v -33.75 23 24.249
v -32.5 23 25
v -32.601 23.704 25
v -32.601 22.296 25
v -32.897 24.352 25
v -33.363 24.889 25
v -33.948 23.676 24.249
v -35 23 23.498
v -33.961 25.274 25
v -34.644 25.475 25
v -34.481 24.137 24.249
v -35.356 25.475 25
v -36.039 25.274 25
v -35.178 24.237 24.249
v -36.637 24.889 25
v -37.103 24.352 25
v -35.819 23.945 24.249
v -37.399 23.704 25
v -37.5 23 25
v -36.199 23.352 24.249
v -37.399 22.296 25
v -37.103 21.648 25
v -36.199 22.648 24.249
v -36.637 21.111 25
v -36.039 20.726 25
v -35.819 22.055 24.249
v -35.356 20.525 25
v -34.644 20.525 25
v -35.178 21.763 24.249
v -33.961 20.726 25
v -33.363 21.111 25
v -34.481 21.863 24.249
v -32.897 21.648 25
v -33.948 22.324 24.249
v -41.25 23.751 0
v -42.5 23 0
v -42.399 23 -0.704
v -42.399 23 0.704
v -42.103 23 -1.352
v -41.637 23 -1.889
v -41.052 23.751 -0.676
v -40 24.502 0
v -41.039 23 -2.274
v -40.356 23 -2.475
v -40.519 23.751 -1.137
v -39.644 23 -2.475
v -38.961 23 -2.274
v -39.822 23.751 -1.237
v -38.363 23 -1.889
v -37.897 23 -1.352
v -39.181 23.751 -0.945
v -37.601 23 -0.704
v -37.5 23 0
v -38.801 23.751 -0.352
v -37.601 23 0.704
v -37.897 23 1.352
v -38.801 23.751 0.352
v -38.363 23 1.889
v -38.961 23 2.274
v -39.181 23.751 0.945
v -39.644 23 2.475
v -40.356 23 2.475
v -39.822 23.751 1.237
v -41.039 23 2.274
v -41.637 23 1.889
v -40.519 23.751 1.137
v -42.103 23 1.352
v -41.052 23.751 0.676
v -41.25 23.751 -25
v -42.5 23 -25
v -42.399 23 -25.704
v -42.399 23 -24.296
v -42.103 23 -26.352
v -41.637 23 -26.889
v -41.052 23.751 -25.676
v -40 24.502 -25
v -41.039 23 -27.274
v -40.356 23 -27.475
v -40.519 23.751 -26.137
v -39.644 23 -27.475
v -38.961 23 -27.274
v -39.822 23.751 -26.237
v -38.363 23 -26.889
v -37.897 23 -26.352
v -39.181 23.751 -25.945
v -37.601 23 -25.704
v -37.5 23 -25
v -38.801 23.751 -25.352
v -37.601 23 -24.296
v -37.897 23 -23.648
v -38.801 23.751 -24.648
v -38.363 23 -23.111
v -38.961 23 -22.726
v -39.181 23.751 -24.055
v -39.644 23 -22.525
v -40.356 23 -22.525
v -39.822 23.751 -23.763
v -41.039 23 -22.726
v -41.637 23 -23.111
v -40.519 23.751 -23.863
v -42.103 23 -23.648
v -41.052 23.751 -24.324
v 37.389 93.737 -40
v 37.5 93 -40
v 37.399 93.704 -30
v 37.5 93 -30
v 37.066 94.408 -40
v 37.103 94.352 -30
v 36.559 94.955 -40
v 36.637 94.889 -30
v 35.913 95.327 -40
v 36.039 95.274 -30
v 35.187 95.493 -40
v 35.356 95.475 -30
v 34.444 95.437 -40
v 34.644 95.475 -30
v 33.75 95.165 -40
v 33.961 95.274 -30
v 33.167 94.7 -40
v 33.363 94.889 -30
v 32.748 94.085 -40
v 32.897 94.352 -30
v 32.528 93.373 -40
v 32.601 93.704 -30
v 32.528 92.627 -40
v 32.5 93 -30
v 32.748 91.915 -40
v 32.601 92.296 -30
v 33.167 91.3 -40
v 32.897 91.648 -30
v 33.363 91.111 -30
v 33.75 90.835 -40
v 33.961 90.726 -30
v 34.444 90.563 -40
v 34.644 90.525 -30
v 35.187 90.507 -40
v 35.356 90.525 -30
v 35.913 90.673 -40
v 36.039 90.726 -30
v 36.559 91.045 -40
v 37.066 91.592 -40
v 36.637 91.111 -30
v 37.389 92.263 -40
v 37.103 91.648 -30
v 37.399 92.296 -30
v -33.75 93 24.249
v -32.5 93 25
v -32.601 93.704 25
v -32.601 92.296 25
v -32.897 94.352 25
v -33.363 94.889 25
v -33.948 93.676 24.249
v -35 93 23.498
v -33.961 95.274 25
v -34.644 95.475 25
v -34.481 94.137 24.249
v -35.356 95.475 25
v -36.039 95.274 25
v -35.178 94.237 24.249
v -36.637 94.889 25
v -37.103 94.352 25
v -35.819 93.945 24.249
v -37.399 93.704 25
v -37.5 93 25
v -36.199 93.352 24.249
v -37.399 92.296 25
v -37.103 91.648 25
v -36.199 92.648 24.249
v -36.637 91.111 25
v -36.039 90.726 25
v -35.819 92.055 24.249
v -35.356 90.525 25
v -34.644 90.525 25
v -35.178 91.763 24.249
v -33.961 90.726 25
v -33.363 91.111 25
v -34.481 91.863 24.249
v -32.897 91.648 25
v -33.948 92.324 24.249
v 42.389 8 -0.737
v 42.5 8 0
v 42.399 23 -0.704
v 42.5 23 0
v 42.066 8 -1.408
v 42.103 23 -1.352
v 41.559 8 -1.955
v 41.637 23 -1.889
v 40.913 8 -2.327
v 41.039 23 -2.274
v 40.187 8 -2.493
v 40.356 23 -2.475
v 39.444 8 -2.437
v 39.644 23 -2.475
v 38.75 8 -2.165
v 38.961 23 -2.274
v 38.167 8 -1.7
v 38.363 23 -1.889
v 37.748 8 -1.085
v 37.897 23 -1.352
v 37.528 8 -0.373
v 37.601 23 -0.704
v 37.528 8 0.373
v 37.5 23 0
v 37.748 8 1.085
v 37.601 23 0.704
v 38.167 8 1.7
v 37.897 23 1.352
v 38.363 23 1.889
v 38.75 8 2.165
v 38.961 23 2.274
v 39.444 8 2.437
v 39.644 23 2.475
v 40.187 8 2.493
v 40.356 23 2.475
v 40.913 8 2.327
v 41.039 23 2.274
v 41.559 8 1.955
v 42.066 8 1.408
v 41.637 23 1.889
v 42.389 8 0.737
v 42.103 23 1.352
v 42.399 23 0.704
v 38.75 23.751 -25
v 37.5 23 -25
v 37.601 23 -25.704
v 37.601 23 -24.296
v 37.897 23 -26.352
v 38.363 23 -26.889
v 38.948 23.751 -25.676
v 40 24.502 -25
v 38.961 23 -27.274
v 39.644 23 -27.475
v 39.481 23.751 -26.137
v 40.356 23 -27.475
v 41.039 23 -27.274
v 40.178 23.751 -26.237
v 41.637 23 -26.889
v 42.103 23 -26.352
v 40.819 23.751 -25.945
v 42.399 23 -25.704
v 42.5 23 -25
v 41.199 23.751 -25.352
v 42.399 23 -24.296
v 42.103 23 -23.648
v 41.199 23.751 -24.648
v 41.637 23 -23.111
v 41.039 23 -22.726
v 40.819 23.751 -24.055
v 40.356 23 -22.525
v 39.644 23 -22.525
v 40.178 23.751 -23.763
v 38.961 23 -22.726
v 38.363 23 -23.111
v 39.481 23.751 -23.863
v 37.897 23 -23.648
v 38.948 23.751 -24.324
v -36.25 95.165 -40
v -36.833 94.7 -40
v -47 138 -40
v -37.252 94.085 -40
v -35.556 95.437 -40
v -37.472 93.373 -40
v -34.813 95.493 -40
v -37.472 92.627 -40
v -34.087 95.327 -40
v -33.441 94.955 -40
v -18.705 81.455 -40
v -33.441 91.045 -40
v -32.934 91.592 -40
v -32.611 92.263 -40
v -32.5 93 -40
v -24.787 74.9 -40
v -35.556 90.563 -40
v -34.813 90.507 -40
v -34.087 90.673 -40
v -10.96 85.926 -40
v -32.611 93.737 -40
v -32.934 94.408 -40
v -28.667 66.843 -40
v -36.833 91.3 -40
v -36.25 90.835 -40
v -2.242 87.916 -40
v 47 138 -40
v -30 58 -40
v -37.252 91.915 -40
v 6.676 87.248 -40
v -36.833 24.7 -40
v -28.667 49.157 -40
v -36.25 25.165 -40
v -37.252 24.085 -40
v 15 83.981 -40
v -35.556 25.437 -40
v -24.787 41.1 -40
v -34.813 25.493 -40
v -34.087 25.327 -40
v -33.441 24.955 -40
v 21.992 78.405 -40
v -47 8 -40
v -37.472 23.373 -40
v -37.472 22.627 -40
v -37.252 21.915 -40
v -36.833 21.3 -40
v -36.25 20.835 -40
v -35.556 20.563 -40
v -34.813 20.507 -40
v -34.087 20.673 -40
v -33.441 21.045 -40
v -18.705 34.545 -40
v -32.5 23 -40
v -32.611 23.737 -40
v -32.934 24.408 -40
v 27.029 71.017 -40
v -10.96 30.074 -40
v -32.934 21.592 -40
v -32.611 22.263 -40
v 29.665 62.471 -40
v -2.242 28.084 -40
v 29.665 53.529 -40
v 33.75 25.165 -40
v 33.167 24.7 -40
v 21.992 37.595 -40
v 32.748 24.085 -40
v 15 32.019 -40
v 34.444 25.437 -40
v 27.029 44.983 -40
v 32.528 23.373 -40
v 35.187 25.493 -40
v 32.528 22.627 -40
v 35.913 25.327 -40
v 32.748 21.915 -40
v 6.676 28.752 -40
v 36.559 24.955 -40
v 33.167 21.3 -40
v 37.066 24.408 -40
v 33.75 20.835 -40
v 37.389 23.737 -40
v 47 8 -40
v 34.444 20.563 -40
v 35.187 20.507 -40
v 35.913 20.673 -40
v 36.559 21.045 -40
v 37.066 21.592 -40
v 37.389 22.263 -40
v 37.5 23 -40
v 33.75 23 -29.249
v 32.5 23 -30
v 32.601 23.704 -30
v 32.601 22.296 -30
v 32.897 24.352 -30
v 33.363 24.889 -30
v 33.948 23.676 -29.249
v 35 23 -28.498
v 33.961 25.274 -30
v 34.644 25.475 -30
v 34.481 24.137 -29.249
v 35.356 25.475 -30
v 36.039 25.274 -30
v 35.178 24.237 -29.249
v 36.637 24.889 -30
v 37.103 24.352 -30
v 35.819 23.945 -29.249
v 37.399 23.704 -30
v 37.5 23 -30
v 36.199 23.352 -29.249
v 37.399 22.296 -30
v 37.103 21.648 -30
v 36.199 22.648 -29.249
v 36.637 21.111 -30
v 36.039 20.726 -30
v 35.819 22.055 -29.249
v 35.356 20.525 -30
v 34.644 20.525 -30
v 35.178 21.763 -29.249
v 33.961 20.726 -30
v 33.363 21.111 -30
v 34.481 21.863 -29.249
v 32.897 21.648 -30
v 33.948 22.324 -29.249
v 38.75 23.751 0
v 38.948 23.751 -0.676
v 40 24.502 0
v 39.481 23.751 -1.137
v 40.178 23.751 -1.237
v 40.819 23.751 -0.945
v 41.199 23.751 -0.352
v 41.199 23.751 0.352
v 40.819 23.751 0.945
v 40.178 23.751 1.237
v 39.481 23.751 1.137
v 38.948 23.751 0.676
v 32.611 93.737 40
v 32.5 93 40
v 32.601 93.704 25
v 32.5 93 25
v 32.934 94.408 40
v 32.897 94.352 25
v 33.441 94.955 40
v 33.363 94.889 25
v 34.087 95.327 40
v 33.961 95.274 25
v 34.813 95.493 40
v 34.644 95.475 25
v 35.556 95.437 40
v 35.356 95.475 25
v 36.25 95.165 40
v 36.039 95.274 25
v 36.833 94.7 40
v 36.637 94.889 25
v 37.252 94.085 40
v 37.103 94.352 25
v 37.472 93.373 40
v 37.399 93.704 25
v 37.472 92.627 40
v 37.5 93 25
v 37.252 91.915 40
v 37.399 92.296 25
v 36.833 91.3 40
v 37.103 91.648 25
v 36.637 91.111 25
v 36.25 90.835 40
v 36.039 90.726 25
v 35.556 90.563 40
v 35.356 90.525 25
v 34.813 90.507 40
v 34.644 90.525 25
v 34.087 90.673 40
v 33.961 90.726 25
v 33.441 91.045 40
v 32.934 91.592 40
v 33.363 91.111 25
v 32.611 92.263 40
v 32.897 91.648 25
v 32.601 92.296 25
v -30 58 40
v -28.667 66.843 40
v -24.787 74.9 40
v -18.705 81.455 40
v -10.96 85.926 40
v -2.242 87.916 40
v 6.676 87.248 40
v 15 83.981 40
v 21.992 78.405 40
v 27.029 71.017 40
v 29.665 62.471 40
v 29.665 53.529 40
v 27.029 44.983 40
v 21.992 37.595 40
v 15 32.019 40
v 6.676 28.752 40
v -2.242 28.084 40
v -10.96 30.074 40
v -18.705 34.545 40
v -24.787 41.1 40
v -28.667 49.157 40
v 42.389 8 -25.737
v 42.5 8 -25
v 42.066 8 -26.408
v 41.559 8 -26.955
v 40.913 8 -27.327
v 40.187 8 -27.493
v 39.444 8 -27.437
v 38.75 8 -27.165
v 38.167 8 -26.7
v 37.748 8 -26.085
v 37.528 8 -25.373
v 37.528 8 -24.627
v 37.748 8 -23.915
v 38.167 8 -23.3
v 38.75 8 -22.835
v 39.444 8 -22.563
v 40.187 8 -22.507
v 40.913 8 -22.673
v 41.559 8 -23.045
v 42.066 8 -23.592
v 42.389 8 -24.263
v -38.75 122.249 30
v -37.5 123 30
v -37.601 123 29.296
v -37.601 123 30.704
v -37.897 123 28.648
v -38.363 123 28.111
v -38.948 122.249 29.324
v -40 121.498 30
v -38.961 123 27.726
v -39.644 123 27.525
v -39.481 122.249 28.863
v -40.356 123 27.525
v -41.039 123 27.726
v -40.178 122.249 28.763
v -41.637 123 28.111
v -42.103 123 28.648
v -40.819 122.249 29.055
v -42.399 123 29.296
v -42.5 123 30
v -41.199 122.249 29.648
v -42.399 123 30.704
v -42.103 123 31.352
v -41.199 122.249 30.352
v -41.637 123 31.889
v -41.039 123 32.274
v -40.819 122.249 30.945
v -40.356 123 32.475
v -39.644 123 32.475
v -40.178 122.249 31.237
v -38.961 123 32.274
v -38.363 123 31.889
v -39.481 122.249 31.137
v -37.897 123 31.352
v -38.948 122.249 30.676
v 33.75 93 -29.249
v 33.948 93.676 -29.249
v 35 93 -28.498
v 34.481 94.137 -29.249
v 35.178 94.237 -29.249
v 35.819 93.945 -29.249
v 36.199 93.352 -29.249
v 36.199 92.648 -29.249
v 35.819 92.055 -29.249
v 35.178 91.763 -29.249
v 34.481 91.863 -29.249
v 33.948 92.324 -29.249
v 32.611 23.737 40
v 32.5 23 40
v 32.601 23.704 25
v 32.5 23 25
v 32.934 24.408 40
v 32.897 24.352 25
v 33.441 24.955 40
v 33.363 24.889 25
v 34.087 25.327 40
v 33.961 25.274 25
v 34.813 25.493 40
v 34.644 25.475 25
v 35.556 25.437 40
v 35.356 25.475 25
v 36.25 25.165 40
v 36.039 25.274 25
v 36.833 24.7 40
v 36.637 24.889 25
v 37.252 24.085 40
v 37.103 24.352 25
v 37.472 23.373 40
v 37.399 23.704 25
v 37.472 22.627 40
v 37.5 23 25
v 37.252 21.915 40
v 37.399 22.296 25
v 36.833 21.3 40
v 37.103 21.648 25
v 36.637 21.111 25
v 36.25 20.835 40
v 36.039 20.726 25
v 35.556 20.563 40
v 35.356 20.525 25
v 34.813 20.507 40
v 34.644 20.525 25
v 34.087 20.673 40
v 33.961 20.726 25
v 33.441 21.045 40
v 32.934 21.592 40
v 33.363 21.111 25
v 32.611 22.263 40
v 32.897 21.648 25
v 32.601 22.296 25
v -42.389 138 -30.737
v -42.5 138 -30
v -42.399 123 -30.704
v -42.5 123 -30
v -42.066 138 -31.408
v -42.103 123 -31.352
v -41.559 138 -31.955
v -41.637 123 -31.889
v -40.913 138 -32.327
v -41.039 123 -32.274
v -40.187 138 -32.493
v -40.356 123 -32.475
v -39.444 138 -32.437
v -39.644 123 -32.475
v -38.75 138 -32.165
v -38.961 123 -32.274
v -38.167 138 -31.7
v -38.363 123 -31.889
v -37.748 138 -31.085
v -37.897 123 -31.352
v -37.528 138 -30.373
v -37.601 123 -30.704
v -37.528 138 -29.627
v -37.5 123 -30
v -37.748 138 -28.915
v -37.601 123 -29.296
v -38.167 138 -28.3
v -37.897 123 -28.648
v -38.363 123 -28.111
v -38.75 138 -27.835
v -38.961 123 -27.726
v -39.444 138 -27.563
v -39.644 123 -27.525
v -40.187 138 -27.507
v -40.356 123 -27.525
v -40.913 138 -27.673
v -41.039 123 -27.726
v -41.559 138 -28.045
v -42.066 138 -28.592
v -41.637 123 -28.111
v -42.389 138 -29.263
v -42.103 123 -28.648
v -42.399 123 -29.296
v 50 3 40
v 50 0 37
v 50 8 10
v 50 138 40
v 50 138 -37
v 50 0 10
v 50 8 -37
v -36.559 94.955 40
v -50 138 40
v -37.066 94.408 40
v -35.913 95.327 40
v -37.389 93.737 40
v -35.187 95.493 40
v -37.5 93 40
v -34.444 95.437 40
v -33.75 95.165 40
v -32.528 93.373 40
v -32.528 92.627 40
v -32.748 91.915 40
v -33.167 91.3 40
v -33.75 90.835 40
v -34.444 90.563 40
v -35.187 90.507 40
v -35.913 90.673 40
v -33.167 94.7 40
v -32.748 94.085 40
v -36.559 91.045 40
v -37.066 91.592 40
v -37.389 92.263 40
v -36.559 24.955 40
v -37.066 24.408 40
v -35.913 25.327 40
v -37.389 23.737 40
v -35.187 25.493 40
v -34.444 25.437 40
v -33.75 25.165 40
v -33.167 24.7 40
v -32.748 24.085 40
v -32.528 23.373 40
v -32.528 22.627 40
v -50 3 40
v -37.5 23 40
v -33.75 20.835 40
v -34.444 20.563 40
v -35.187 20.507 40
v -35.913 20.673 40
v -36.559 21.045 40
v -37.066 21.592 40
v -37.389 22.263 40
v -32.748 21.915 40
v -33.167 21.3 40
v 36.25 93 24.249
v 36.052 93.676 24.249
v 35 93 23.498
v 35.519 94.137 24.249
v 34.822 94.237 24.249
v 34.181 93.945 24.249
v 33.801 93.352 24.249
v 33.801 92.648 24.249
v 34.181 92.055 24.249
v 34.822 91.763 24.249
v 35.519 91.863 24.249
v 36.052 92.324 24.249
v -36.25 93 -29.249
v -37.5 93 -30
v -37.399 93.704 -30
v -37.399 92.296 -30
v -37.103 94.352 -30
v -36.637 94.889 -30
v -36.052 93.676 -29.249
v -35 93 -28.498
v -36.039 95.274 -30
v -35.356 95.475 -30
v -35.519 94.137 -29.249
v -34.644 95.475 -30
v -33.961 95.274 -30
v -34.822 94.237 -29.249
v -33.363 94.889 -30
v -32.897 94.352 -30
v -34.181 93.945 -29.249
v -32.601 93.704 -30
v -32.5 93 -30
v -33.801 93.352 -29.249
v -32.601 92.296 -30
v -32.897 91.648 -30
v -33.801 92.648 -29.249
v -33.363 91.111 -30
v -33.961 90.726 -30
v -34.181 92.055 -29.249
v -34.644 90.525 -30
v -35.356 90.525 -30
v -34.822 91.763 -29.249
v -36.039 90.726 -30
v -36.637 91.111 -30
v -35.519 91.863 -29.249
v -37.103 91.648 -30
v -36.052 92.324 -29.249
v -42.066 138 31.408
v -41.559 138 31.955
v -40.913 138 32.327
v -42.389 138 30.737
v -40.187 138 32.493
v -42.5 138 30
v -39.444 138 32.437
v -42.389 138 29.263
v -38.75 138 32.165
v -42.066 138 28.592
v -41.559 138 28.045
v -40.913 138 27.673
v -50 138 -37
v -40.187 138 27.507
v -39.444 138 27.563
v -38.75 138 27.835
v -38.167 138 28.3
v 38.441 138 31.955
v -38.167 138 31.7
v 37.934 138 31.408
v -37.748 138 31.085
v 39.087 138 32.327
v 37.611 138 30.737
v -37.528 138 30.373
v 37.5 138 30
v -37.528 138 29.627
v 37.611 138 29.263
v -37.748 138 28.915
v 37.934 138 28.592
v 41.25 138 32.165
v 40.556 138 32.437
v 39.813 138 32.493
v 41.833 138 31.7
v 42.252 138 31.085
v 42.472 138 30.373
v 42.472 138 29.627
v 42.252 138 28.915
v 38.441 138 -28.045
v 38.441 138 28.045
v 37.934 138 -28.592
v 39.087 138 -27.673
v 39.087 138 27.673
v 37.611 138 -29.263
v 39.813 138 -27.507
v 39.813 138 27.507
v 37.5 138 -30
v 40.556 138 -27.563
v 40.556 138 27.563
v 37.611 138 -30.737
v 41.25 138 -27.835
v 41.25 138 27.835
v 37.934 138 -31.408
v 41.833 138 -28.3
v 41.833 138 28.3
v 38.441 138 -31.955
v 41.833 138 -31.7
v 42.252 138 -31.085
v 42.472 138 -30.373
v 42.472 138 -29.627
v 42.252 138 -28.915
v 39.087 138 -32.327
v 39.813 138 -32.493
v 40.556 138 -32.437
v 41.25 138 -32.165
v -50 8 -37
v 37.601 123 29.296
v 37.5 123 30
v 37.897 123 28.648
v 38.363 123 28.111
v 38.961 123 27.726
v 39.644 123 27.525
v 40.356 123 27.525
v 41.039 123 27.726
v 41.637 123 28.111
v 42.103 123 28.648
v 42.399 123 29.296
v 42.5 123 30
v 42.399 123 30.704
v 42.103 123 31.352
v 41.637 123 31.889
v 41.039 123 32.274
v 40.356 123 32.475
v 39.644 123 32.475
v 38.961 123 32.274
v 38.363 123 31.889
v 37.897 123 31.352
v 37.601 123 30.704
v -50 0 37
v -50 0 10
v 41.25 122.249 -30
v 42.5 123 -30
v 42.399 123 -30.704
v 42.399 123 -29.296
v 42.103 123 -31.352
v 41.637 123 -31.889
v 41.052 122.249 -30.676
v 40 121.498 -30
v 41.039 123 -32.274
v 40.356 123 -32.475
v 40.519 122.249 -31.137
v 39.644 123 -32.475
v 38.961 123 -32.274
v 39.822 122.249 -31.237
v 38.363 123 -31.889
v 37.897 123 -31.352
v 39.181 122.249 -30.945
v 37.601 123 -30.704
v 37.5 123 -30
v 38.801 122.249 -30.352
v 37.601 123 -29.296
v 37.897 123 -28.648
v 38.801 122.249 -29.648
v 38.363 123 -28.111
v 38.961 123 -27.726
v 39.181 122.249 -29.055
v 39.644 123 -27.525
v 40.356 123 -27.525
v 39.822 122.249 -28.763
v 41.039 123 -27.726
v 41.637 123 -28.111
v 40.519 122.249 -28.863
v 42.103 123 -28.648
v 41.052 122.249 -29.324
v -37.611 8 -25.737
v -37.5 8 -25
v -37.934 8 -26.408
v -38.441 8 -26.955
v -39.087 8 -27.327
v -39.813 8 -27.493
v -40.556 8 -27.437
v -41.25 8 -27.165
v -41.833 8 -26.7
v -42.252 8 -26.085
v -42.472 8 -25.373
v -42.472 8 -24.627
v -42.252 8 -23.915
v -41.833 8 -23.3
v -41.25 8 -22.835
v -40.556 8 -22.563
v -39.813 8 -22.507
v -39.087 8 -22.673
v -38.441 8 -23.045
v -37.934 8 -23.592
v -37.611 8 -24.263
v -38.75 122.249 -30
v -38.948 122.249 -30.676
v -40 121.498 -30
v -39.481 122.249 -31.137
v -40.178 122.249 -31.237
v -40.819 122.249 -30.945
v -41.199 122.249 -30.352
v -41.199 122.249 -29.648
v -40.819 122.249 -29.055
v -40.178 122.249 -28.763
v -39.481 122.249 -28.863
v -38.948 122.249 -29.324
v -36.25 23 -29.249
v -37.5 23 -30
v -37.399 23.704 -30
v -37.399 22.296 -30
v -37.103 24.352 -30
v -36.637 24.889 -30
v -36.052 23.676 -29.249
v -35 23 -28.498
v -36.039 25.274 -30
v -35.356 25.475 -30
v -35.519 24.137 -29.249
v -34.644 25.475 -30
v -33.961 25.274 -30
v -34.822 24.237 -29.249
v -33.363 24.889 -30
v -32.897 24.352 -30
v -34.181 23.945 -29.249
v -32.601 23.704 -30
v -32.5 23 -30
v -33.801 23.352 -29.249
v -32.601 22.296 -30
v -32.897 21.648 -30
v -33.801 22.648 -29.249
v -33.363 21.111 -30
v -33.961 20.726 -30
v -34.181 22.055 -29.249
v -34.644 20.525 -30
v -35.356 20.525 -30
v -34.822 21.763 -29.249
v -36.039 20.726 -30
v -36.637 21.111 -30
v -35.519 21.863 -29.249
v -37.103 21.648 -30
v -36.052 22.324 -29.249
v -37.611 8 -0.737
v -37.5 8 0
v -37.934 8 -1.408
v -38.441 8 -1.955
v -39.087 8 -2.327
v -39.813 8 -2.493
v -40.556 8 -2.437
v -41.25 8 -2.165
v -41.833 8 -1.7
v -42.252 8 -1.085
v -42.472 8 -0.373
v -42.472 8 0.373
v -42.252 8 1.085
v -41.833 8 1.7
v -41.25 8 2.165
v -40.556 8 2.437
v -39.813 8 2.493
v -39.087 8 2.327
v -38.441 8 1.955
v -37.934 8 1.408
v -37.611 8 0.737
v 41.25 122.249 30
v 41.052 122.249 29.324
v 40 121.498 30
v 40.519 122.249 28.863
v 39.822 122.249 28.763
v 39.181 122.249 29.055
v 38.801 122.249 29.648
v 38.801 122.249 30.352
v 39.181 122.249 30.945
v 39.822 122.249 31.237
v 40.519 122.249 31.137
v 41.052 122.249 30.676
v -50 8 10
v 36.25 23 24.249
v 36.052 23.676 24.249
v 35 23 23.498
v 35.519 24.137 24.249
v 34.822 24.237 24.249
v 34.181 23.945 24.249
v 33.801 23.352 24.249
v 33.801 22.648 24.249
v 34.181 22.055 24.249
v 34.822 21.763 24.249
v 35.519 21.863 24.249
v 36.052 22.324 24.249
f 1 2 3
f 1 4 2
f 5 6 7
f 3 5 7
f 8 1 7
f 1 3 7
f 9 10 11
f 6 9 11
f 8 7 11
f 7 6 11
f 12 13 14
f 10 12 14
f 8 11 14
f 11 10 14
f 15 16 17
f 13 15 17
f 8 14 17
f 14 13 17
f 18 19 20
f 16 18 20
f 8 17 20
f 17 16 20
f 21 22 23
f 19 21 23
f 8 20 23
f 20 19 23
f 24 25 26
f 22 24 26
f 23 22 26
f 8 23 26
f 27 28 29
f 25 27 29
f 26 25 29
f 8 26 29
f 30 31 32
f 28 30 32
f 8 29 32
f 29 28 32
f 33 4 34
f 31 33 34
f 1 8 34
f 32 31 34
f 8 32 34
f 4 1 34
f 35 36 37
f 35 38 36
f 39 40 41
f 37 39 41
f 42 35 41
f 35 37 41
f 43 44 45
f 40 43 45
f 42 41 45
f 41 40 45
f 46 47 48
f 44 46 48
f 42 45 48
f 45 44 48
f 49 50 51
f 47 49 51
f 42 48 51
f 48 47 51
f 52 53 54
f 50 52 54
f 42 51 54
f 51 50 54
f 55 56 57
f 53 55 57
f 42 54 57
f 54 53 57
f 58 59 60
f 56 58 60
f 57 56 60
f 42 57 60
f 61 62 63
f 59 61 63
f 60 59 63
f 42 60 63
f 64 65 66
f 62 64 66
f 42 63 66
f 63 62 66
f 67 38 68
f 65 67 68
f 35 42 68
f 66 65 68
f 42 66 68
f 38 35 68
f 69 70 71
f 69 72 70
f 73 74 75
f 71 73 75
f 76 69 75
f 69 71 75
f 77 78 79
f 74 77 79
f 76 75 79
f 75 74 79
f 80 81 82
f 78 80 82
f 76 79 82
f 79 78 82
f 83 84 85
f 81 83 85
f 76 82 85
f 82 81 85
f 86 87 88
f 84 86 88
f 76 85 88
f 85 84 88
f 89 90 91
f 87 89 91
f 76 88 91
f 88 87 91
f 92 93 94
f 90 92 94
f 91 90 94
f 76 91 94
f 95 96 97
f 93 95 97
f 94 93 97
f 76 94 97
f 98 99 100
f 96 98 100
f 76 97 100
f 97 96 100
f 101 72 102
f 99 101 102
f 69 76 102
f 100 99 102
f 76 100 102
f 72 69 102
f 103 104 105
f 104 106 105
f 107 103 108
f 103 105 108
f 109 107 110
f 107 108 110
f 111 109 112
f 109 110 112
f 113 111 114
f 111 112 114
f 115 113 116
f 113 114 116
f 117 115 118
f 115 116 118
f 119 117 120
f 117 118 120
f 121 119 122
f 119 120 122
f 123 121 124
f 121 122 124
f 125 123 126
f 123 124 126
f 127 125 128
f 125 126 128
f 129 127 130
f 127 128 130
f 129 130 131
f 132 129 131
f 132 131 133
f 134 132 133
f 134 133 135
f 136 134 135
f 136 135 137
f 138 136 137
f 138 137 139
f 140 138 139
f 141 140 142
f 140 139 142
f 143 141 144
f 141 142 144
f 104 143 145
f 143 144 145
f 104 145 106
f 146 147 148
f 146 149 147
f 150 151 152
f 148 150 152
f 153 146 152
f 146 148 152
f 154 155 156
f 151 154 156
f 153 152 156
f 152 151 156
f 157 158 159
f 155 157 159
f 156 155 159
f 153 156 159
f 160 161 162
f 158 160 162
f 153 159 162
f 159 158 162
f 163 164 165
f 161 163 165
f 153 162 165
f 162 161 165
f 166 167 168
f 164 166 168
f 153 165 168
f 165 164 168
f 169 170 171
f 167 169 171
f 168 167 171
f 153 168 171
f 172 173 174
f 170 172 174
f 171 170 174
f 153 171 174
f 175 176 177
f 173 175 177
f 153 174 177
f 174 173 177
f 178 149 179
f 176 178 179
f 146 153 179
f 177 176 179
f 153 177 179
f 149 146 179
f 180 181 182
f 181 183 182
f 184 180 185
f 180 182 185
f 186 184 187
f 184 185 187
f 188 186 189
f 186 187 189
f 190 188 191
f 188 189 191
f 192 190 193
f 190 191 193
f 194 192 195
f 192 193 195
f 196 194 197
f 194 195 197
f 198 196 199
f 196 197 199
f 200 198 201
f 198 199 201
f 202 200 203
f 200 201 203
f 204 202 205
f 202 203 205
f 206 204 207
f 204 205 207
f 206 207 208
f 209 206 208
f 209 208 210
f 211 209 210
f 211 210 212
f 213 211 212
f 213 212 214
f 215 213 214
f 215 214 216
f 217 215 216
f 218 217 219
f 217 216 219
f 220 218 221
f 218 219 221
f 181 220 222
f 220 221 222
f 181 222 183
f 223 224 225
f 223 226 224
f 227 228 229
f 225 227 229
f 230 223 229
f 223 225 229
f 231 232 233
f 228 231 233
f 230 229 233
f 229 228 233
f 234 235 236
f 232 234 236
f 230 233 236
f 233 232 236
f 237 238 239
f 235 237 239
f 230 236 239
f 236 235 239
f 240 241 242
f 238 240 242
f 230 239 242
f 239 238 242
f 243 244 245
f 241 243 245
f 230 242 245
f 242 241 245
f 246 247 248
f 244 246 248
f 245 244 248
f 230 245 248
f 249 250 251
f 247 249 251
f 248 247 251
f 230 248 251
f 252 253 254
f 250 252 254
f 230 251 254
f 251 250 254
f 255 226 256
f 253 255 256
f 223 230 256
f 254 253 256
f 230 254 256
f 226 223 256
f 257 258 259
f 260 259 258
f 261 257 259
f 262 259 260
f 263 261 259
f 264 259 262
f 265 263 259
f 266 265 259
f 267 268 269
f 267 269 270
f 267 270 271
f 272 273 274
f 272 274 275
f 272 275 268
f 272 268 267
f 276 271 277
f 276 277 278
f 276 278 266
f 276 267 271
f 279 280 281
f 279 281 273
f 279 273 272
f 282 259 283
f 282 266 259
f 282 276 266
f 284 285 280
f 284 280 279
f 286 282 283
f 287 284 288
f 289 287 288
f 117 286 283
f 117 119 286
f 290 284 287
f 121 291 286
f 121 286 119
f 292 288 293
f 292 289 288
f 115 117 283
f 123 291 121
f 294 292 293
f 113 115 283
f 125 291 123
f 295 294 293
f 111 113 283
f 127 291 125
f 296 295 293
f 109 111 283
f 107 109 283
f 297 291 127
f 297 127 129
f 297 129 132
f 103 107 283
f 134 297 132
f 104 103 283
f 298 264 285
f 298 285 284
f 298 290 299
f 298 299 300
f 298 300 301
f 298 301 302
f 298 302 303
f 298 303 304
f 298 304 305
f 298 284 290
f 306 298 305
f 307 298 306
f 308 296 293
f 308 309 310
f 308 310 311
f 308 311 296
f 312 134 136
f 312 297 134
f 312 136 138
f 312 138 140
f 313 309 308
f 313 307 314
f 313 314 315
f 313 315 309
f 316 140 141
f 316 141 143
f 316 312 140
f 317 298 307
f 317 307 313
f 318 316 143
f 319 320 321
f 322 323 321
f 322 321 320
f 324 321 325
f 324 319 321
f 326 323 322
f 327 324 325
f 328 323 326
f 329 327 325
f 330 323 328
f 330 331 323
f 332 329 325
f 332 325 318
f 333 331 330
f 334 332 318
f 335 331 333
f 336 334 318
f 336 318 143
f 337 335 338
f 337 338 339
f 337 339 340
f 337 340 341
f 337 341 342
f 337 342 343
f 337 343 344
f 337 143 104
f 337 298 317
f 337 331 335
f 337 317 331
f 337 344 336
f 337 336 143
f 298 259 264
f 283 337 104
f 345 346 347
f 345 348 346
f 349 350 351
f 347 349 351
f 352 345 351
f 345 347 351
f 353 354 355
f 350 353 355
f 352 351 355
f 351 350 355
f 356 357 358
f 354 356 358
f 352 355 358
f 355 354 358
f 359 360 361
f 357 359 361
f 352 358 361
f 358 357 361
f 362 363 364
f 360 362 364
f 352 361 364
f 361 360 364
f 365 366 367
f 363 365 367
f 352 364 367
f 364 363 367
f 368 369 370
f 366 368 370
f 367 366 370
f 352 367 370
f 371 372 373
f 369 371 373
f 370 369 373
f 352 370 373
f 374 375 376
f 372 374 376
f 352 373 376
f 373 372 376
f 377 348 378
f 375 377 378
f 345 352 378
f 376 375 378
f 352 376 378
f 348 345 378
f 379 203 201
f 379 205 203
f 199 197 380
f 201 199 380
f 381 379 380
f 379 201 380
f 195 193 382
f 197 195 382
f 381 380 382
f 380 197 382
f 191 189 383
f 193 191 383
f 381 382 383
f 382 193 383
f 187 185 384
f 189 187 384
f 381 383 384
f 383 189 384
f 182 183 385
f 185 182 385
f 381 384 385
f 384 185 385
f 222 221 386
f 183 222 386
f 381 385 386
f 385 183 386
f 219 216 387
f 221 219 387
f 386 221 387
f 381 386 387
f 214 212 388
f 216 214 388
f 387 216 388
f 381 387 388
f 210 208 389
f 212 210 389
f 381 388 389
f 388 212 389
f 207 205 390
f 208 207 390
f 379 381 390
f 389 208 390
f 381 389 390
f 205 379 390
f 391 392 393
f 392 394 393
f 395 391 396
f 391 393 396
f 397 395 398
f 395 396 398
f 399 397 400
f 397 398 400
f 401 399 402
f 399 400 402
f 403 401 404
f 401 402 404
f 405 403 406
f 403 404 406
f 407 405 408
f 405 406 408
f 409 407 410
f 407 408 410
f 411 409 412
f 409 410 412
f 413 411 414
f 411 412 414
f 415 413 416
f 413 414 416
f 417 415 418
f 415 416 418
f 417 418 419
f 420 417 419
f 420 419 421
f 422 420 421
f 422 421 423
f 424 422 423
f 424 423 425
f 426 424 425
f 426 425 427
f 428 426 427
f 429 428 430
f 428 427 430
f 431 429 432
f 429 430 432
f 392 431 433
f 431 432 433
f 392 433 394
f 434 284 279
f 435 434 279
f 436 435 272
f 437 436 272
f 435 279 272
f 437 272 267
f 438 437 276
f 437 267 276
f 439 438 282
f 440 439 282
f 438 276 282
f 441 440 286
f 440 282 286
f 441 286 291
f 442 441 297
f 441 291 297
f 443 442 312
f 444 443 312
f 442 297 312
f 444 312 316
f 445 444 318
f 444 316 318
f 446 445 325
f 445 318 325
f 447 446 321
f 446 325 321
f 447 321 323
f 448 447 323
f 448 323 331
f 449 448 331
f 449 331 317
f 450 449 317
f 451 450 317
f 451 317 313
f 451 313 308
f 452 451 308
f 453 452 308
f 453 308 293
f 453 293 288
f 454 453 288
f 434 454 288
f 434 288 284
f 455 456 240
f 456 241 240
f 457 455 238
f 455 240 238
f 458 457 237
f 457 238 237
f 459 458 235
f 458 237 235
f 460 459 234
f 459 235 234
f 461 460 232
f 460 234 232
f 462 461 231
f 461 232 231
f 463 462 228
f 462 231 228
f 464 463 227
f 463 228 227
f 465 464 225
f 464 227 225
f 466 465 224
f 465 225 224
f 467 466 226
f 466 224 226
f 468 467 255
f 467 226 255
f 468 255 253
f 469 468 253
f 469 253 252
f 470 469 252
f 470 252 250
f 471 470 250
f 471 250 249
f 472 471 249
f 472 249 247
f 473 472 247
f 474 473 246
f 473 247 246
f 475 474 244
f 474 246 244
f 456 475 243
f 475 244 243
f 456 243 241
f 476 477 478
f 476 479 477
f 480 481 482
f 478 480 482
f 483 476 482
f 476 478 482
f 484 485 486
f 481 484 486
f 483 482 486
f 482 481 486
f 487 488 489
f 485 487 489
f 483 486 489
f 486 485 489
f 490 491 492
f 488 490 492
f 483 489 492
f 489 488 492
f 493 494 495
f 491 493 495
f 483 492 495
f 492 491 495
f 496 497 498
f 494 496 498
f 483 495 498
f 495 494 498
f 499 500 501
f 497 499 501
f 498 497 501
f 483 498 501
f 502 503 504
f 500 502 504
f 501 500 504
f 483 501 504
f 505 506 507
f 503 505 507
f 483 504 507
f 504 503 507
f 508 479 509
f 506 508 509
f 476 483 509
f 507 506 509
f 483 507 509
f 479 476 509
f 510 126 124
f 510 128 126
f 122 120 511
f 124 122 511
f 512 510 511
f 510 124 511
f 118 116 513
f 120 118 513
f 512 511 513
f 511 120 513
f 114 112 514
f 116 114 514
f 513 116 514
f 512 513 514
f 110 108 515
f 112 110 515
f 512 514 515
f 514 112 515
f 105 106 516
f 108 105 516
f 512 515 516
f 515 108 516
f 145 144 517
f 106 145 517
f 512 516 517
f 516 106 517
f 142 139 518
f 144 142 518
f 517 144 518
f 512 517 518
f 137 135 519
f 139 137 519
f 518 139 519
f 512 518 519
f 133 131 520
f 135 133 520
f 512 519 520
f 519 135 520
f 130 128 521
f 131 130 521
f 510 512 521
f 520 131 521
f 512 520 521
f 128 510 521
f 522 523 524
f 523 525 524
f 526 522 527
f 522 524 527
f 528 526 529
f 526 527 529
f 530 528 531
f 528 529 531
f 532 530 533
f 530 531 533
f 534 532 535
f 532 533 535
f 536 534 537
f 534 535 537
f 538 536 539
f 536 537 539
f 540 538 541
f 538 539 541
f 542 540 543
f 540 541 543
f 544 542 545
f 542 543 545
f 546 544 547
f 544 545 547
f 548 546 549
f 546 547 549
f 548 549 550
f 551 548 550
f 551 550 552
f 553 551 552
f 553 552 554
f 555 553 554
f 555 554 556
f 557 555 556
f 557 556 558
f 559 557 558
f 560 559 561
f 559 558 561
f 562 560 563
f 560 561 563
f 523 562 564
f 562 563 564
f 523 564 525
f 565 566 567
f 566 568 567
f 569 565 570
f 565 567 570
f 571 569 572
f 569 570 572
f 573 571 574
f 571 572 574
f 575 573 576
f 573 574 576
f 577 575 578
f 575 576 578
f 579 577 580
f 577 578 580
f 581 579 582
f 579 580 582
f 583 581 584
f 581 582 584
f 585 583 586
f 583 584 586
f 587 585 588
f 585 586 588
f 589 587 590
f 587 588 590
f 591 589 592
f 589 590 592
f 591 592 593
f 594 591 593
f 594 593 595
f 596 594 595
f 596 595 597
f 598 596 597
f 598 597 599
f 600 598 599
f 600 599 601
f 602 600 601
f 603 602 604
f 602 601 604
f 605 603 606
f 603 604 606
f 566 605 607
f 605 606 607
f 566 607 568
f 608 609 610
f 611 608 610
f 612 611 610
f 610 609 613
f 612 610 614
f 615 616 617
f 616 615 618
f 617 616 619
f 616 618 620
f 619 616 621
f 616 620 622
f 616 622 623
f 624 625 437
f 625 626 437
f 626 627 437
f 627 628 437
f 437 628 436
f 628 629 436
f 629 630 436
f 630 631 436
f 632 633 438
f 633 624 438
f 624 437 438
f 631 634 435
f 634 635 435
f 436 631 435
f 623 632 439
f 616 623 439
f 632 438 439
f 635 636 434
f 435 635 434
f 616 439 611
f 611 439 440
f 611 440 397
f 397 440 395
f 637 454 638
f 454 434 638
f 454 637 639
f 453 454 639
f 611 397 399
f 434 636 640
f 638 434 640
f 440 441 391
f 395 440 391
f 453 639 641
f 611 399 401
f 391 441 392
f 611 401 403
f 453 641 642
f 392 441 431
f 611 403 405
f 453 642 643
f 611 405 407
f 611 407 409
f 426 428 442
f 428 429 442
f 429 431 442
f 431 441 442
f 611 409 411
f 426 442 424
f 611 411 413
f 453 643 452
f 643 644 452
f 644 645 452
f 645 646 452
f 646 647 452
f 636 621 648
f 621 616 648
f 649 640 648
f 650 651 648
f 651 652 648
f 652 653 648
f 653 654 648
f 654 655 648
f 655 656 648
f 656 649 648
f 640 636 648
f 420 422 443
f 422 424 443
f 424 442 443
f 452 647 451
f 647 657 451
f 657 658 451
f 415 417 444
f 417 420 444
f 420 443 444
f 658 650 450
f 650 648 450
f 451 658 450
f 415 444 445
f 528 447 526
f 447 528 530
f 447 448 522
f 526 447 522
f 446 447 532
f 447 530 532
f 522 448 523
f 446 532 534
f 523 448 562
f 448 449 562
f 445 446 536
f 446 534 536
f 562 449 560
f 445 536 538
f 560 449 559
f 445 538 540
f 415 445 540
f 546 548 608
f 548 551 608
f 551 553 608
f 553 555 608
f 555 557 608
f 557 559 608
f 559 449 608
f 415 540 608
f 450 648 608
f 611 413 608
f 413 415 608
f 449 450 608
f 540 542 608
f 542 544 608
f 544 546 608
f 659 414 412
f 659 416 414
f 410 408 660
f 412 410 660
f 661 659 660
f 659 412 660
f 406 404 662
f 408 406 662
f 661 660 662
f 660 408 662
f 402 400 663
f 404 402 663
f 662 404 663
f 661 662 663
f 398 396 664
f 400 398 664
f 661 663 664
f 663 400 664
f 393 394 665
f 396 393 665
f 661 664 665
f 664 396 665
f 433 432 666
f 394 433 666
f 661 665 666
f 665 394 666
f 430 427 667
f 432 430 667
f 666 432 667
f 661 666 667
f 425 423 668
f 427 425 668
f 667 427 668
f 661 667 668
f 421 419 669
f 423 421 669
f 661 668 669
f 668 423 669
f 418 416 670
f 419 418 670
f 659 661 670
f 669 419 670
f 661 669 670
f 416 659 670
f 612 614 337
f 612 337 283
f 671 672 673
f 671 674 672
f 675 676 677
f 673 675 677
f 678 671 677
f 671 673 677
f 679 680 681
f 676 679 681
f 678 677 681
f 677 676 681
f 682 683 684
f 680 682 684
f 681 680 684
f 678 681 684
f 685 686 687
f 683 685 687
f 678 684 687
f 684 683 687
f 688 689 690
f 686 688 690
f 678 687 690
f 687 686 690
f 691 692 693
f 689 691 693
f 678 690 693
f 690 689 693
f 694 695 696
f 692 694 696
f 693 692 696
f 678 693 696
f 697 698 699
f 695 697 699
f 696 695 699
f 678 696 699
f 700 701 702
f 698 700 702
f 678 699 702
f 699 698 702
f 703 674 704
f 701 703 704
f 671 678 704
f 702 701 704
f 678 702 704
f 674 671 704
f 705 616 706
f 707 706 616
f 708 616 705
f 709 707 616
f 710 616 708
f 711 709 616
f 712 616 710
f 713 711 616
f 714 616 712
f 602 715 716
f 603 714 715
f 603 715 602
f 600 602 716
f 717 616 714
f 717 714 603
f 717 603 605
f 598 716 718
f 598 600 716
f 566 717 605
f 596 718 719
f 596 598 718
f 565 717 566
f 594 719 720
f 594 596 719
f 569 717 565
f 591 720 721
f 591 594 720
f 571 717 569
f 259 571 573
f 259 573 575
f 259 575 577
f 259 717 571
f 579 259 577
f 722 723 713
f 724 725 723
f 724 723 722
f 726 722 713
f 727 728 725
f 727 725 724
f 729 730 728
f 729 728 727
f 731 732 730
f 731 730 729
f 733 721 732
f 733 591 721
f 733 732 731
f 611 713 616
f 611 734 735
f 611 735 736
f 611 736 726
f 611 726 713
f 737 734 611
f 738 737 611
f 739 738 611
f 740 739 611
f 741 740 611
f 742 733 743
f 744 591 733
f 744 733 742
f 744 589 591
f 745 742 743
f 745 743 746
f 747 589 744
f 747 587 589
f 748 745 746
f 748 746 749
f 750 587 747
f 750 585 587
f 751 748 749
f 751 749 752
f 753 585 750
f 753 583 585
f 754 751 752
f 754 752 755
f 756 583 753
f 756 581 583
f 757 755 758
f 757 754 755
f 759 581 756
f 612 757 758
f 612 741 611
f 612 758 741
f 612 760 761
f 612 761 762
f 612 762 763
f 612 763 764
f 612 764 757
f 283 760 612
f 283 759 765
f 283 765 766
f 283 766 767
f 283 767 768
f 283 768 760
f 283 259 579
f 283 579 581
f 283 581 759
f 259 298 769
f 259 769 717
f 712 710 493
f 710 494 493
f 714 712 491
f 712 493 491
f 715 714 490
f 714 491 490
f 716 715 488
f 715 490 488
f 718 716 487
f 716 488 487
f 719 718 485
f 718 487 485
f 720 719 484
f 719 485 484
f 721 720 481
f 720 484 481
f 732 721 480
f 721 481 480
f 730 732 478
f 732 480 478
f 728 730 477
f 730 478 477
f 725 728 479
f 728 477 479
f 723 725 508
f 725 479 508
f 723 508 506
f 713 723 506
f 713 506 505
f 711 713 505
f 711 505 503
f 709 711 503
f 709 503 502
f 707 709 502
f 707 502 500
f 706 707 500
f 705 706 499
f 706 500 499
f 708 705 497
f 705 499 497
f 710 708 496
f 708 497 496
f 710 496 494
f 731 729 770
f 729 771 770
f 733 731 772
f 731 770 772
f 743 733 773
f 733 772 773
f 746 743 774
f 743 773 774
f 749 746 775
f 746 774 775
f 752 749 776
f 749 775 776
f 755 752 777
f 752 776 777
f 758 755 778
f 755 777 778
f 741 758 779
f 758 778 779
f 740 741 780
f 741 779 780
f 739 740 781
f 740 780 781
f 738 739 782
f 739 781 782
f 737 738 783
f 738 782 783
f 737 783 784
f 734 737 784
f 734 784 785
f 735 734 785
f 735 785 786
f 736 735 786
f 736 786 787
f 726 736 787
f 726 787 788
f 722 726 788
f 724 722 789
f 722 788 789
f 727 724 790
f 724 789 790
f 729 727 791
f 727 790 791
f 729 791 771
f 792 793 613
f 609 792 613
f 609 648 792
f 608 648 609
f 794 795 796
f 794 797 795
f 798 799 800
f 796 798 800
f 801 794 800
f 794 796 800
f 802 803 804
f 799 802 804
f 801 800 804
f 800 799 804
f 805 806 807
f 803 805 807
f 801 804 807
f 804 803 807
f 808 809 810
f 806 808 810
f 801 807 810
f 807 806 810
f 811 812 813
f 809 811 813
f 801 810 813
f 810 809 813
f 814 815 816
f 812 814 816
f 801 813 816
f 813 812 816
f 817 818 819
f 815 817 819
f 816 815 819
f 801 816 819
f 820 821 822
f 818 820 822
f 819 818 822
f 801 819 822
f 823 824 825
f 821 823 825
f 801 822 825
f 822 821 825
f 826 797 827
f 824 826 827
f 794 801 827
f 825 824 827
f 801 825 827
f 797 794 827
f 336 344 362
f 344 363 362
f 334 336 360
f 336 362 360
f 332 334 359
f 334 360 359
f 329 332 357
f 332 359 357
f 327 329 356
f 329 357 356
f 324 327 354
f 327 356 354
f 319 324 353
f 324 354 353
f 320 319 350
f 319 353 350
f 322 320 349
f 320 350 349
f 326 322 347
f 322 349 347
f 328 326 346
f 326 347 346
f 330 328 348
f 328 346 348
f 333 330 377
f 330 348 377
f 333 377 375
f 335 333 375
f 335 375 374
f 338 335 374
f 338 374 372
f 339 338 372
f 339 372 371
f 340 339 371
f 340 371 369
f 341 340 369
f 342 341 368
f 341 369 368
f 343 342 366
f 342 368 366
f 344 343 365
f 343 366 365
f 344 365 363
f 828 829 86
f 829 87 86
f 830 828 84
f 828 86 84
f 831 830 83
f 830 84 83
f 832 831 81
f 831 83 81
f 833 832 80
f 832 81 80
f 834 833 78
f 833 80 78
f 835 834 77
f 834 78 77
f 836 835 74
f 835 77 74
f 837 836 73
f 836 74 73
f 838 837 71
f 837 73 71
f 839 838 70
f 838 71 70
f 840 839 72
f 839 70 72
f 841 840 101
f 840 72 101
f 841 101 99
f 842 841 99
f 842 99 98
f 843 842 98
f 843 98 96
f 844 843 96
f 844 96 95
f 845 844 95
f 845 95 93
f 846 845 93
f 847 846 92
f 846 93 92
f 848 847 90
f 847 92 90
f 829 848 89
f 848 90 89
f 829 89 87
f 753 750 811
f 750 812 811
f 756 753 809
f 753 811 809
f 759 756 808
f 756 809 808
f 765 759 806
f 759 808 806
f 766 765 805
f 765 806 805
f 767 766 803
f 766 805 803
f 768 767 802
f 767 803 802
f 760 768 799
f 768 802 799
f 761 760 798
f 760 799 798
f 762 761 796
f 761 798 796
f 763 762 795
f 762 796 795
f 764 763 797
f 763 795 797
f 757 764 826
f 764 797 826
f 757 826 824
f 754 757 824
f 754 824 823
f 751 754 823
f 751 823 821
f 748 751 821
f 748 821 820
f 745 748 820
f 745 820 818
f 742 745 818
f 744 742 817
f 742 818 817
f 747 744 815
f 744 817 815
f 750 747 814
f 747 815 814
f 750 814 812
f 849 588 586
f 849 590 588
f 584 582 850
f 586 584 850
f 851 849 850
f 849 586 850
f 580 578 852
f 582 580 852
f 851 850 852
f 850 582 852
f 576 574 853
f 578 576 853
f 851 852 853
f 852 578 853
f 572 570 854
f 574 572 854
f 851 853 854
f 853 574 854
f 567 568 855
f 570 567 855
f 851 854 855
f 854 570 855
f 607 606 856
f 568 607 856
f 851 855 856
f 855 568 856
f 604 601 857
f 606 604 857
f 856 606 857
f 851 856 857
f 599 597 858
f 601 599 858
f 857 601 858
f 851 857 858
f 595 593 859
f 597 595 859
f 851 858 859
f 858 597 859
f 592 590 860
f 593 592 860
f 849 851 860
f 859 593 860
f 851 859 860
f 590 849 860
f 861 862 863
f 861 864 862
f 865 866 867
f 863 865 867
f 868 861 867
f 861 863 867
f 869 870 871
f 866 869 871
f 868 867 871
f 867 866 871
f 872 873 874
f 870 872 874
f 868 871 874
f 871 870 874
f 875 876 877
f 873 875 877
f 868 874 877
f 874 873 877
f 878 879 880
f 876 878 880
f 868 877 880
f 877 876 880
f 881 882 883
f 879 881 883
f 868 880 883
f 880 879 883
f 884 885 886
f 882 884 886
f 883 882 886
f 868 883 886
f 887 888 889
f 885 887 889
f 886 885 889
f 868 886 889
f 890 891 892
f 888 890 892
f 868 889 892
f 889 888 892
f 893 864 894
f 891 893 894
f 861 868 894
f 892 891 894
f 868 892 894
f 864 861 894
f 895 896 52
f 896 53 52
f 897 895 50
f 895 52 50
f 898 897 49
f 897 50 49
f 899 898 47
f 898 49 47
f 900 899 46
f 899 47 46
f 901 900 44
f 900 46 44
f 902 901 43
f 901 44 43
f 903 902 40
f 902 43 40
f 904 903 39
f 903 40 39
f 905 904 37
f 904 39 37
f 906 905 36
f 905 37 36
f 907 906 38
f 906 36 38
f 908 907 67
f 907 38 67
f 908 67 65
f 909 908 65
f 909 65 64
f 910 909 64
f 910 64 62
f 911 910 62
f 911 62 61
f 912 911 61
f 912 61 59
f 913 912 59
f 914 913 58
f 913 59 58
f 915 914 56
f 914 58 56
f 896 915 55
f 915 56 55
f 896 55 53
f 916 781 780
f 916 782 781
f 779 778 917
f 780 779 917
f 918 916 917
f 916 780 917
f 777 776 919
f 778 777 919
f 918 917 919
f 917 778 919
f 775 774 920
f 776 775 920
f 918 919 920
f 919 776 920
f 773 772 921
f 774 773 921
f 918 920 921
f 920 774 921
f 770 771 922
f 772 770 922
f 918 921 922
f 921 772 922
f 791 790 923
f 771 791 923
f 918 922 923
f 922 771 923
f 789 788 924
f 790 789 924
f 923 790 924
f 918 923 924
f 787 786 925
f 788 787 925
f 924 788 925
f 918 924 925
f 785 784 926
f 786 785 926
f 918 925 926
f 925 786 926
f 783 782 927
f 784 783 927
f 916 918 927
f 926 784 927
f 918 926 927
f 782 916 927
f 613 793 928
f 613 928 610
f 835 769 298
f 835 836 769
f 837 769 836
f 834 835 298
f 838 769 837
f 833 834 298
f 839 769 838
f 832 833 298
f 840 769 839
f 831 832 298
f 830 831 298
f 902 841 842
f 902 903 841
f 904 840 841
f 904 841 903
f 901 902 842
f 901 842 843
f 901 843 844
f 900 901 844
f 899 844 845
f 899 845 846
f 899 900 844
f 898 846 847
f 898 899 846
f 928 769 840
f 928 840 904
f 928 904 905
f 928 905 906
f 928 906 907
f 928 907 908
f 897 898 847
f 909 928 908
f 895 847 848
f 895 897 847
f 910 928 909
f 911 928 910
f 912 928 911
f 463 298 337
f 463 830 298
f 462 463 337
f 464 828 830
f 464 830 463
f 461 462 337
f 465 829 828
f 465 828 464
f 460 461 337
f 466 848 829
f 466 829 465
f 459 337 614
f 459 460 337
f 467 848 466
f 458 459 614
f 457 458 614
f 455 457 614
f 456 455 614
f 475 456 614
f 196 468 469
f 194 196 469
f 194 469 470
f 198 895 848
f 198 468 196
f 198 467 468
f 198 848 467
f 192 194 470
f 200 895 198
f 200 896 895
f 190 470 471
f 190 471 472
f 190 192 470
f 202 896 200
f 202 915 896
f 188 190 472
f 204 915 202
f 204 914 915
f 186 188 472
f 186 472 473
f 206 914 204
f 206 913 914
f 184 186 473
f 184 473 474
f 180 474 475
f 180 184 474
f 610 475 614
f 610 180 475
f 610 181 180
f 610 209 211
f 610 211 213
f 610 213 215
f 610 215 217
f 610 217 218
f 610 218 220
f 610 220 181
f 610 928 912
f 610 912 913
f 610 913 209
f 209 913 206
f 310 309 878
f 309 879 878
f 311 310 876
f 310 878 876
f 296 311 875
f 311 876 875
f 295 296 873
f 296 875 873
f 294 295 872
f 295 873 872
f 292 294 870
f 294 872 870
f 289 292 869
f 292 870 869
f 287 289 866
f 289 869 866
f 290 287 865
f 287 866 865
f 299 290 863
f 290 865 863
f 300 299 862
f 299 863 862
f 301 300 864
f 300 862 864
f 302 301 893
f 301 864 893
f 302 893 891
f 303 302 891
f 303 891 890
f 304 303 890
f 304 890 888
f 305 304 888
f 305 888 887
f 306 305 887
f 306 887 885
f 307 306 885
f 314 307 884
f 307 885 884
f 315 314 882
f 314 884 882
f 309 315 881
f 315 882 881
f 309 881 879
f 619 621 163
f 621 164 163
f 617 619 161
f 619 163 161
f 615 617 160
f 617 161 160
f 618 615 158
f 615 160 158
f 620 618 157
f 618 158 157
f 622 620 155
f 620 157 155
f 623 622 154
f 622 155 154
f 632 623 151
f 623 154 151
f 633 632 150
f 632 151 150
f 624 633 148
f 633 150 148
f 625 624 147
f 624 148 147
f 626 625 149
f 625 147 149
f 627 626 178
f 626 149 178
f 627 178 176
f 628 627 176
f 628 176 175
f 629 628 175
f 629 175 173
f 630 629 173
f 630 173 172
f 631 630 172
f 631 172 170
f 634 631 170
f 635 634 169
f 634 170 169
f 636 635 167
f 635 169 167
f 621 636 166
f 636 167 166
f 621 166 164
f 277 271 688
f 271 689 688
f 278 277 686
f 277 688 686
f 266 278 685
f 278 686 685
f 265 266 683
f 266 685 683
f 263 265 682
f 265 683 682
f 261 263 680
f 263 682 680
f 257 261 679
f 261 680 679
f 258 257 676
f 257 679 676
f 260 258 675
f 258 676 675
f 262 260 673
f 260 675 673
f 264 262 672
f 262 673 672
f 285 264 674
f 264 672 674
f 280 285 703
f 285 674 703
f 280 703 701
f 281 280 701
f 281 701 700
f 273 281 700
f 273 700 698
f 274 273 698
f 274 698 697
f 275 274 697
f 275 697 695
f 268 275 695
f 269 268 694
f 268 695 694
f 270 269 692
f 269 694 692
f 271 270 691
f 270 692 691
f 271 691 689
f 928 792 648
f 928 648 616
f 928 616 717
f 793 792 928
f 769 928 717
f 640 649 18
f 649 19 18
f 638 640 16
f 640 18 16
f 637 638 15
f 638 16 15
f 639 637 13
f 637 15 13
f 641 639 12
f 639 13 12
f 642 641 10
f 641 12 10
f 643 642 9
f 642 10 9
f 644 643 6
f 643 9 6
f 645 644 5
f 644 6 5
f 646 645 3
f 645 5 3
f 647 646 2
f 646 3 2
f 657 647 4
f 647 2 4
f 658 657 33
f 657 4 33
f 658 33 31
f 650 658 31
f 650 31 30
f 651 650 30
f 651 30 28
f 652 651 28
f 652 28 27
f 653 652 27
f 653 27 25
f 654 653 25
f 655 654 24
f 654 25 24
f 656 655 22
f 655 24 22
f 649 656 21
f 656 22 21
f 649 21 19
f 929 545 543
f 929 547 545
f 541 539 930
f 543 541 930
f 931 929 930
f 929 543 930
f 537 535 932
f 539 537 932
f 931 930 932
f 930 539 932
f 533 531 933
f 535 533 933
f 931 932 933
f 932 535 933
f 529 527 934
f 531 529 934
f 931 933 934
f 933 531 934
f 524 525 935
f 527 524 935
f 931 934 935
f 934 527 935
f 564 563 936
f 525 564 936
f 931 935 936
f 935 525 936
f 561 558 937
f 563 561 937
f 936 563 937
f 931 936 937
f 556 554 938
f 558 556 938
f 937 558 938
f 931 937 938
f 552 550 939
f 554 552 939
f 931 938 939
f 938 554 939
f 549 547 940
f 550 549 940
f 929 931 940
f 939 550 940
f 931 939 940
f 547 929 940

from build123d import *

# Parameters (mm, degrees)
SKETCH1_W             = 100
SKETCH1_H             = 80
BOSS_EXTRUDE1_DEPTH   = 138
SKETCH2_W             = 100
SKETCH2_H             = 50
CUT_EXTRUDE1_DEPTH    = 8
M6_TAPPED_HOLE1_D     = 5
M6_TAPPED_HOLE1_DEPTH = 15
M6_TAPPED_HOLE1_TIP   = 1.502151548
SKETCH6_R             = 30
CUT_EXTRUDE2_DEPTH    = 168.164589552
M6_TAPPED_HOLE2_D     = 5
M6_TAPPED_HOLE2_DEPTH = 15
M6_TAPPED_HOLE2_TIP   = 1.502151548
M6_TAPPED_HOLE3_D     = 5
M6_TAPPED_HOLE3_DEPTH = 10
M6_TAPPED_HOLE3_TIP   = 1.502151548
M6_TAPPED_HOLE4_D     = 5
M6_TAPPED_HOLE4_DEPTH = 15
M6_TAPPED_HOLE4_TIP   = 1.502151548
CHAMFER1_SIZE         = 3


with BuildPart() as part:
    # Sketch1 → Boss-Extrude1 (new body)
    with BuildSketch(Plane(origin=(0, 0, 0), x_dir=(1, 0, 0), z_dir=(0, 1, 0))):
        Rectangle(SKETCH1_W, SKETCH1_H)
    extrude(amount=BOSS_EXTRUDE1_DEPTH)

    # Sketch2 → Cut-Extrude1 (cut)
    with BuildSketch(Plane.XZ):
        with Locations((0, -15)):
            Rectangle(SKETCH2_W, SKETCH2_H)
    extrude(amount=-CUT_EXTRUDE1_DEPTH, mode=Mode.SUBTRACT)

    # M6 Tapped Hole1
    with Locations(Plane(origin=(0, 8, 0), x_dir=(-1, 0, 0), z_dir=(0, -1, 0))):
        with Locations((-40, 25), (-40, 0), (40, 0), (40, 25)):
            Hole(M6_TAPPED_HOLE1_D / 2, depth=M6_TAPPED_HOLE1_DEPTH)
            with Locations((0, 0, -(M6_TAPPED_HOLE1_DEPTH + M6_TAPPED_HOLE1_TIP / 2))):  # 118° drill point
                Cone(0, M6_TAPPED_HOLE1_D / 2, M6_TAPPED_HOLE1_TIP, mode=Mode.SUBTRACT)

    # Sketch6 → Cut-Extrude2 (cut, through all)
    with BuildSketch(Plane(origin=(0, 0, -40), x_dir=(-1, 0, 0), z_dir=(0, 0, -1))):
        with Locations((0, 58)):
            Circle(SKETCH6_R)
    extrude(amount=-CUT_EXTRUDE2_DEPTH, mode=Mode.SUBTRACT)

    # M6 Tapped Hole2
    with Locations(Plane(origin=(0, 138, 0), x_dir=(1, 0, 0), z_dir=(0, 1, 0))):
        with Locations((-40, 30), (-40, -30), (40, -30), (40, 30)):
            Hole(M6_TAPPED_HOLE2_D / 2, depth=M6_TAPPED_HOLE2_DEPTH)
            with Locations((0, 0, -(M6_TAPPED_HOLE2_DEPTH + M6_TAPPED_HOLE2_TIP / 2))):  # 118° drill point
                Cone(0, M6_TAPPED_HOLE2_D / 2, M6_TAPPED_HOLE2_TIP, mode=Mode.SUBTRACT)

    # M6 Tapped Hole3
    with Locations(Plane(origin=(0, 0, -40), x_dir=(-1, 0, 0), z_dir=(0, 0, -1))):
        with Locations((-35, 23), (-35, 93), (35, 93), (35, 23)):
            Hole(M6_TAPPED_HOLE3_D / 2, depth=M6_TAPPED_HOLE3_DEPTH)
            with Locations((0, 0, -(M6_TAPPED_HOLE3_DEPTH + M6_TAPPED_HOLE3_TIP / 2))):  # 118° drill point
                Cone(0, M6_TAPPED_HOLE3_D / 2, M6_TAPPED_HOLE3_TIP, mode=Mode.SUBTRACT)

    # M6 Tapped Hole4
    with Locations(Plane.XY.offset(40)):
        with Locations((-35, 93), (35, 93), (35, 23), (-35, 23)):
            Hole(M6_TAPPED_HOLE4_D / 2, depth=M6_TAPPED_HOLE4_DEPTH)
            with Locations((0, 0, -(M6_TAPPED_HOLE4_DEPTH + M6_TAPPED_HOLE4_TIP / 2))):  # 118° drill point
                Cone(0, M6_TAPPED_HOLE4_D / 2, M6_TAPPED_HOLE4_TIP, mode=Mode.SUBTRACT)

    # Chamfer1
    chamfer1_edges = [part.edges().sort_by_distance(p)[0] for p in [
        (0, 0, 40),
        (-50, 73, -40),
        (50, 73, -40),
    ]]
    chamfer(chamfer1_edges, length=CHAMFER1_SIZE)


solid = part.part
